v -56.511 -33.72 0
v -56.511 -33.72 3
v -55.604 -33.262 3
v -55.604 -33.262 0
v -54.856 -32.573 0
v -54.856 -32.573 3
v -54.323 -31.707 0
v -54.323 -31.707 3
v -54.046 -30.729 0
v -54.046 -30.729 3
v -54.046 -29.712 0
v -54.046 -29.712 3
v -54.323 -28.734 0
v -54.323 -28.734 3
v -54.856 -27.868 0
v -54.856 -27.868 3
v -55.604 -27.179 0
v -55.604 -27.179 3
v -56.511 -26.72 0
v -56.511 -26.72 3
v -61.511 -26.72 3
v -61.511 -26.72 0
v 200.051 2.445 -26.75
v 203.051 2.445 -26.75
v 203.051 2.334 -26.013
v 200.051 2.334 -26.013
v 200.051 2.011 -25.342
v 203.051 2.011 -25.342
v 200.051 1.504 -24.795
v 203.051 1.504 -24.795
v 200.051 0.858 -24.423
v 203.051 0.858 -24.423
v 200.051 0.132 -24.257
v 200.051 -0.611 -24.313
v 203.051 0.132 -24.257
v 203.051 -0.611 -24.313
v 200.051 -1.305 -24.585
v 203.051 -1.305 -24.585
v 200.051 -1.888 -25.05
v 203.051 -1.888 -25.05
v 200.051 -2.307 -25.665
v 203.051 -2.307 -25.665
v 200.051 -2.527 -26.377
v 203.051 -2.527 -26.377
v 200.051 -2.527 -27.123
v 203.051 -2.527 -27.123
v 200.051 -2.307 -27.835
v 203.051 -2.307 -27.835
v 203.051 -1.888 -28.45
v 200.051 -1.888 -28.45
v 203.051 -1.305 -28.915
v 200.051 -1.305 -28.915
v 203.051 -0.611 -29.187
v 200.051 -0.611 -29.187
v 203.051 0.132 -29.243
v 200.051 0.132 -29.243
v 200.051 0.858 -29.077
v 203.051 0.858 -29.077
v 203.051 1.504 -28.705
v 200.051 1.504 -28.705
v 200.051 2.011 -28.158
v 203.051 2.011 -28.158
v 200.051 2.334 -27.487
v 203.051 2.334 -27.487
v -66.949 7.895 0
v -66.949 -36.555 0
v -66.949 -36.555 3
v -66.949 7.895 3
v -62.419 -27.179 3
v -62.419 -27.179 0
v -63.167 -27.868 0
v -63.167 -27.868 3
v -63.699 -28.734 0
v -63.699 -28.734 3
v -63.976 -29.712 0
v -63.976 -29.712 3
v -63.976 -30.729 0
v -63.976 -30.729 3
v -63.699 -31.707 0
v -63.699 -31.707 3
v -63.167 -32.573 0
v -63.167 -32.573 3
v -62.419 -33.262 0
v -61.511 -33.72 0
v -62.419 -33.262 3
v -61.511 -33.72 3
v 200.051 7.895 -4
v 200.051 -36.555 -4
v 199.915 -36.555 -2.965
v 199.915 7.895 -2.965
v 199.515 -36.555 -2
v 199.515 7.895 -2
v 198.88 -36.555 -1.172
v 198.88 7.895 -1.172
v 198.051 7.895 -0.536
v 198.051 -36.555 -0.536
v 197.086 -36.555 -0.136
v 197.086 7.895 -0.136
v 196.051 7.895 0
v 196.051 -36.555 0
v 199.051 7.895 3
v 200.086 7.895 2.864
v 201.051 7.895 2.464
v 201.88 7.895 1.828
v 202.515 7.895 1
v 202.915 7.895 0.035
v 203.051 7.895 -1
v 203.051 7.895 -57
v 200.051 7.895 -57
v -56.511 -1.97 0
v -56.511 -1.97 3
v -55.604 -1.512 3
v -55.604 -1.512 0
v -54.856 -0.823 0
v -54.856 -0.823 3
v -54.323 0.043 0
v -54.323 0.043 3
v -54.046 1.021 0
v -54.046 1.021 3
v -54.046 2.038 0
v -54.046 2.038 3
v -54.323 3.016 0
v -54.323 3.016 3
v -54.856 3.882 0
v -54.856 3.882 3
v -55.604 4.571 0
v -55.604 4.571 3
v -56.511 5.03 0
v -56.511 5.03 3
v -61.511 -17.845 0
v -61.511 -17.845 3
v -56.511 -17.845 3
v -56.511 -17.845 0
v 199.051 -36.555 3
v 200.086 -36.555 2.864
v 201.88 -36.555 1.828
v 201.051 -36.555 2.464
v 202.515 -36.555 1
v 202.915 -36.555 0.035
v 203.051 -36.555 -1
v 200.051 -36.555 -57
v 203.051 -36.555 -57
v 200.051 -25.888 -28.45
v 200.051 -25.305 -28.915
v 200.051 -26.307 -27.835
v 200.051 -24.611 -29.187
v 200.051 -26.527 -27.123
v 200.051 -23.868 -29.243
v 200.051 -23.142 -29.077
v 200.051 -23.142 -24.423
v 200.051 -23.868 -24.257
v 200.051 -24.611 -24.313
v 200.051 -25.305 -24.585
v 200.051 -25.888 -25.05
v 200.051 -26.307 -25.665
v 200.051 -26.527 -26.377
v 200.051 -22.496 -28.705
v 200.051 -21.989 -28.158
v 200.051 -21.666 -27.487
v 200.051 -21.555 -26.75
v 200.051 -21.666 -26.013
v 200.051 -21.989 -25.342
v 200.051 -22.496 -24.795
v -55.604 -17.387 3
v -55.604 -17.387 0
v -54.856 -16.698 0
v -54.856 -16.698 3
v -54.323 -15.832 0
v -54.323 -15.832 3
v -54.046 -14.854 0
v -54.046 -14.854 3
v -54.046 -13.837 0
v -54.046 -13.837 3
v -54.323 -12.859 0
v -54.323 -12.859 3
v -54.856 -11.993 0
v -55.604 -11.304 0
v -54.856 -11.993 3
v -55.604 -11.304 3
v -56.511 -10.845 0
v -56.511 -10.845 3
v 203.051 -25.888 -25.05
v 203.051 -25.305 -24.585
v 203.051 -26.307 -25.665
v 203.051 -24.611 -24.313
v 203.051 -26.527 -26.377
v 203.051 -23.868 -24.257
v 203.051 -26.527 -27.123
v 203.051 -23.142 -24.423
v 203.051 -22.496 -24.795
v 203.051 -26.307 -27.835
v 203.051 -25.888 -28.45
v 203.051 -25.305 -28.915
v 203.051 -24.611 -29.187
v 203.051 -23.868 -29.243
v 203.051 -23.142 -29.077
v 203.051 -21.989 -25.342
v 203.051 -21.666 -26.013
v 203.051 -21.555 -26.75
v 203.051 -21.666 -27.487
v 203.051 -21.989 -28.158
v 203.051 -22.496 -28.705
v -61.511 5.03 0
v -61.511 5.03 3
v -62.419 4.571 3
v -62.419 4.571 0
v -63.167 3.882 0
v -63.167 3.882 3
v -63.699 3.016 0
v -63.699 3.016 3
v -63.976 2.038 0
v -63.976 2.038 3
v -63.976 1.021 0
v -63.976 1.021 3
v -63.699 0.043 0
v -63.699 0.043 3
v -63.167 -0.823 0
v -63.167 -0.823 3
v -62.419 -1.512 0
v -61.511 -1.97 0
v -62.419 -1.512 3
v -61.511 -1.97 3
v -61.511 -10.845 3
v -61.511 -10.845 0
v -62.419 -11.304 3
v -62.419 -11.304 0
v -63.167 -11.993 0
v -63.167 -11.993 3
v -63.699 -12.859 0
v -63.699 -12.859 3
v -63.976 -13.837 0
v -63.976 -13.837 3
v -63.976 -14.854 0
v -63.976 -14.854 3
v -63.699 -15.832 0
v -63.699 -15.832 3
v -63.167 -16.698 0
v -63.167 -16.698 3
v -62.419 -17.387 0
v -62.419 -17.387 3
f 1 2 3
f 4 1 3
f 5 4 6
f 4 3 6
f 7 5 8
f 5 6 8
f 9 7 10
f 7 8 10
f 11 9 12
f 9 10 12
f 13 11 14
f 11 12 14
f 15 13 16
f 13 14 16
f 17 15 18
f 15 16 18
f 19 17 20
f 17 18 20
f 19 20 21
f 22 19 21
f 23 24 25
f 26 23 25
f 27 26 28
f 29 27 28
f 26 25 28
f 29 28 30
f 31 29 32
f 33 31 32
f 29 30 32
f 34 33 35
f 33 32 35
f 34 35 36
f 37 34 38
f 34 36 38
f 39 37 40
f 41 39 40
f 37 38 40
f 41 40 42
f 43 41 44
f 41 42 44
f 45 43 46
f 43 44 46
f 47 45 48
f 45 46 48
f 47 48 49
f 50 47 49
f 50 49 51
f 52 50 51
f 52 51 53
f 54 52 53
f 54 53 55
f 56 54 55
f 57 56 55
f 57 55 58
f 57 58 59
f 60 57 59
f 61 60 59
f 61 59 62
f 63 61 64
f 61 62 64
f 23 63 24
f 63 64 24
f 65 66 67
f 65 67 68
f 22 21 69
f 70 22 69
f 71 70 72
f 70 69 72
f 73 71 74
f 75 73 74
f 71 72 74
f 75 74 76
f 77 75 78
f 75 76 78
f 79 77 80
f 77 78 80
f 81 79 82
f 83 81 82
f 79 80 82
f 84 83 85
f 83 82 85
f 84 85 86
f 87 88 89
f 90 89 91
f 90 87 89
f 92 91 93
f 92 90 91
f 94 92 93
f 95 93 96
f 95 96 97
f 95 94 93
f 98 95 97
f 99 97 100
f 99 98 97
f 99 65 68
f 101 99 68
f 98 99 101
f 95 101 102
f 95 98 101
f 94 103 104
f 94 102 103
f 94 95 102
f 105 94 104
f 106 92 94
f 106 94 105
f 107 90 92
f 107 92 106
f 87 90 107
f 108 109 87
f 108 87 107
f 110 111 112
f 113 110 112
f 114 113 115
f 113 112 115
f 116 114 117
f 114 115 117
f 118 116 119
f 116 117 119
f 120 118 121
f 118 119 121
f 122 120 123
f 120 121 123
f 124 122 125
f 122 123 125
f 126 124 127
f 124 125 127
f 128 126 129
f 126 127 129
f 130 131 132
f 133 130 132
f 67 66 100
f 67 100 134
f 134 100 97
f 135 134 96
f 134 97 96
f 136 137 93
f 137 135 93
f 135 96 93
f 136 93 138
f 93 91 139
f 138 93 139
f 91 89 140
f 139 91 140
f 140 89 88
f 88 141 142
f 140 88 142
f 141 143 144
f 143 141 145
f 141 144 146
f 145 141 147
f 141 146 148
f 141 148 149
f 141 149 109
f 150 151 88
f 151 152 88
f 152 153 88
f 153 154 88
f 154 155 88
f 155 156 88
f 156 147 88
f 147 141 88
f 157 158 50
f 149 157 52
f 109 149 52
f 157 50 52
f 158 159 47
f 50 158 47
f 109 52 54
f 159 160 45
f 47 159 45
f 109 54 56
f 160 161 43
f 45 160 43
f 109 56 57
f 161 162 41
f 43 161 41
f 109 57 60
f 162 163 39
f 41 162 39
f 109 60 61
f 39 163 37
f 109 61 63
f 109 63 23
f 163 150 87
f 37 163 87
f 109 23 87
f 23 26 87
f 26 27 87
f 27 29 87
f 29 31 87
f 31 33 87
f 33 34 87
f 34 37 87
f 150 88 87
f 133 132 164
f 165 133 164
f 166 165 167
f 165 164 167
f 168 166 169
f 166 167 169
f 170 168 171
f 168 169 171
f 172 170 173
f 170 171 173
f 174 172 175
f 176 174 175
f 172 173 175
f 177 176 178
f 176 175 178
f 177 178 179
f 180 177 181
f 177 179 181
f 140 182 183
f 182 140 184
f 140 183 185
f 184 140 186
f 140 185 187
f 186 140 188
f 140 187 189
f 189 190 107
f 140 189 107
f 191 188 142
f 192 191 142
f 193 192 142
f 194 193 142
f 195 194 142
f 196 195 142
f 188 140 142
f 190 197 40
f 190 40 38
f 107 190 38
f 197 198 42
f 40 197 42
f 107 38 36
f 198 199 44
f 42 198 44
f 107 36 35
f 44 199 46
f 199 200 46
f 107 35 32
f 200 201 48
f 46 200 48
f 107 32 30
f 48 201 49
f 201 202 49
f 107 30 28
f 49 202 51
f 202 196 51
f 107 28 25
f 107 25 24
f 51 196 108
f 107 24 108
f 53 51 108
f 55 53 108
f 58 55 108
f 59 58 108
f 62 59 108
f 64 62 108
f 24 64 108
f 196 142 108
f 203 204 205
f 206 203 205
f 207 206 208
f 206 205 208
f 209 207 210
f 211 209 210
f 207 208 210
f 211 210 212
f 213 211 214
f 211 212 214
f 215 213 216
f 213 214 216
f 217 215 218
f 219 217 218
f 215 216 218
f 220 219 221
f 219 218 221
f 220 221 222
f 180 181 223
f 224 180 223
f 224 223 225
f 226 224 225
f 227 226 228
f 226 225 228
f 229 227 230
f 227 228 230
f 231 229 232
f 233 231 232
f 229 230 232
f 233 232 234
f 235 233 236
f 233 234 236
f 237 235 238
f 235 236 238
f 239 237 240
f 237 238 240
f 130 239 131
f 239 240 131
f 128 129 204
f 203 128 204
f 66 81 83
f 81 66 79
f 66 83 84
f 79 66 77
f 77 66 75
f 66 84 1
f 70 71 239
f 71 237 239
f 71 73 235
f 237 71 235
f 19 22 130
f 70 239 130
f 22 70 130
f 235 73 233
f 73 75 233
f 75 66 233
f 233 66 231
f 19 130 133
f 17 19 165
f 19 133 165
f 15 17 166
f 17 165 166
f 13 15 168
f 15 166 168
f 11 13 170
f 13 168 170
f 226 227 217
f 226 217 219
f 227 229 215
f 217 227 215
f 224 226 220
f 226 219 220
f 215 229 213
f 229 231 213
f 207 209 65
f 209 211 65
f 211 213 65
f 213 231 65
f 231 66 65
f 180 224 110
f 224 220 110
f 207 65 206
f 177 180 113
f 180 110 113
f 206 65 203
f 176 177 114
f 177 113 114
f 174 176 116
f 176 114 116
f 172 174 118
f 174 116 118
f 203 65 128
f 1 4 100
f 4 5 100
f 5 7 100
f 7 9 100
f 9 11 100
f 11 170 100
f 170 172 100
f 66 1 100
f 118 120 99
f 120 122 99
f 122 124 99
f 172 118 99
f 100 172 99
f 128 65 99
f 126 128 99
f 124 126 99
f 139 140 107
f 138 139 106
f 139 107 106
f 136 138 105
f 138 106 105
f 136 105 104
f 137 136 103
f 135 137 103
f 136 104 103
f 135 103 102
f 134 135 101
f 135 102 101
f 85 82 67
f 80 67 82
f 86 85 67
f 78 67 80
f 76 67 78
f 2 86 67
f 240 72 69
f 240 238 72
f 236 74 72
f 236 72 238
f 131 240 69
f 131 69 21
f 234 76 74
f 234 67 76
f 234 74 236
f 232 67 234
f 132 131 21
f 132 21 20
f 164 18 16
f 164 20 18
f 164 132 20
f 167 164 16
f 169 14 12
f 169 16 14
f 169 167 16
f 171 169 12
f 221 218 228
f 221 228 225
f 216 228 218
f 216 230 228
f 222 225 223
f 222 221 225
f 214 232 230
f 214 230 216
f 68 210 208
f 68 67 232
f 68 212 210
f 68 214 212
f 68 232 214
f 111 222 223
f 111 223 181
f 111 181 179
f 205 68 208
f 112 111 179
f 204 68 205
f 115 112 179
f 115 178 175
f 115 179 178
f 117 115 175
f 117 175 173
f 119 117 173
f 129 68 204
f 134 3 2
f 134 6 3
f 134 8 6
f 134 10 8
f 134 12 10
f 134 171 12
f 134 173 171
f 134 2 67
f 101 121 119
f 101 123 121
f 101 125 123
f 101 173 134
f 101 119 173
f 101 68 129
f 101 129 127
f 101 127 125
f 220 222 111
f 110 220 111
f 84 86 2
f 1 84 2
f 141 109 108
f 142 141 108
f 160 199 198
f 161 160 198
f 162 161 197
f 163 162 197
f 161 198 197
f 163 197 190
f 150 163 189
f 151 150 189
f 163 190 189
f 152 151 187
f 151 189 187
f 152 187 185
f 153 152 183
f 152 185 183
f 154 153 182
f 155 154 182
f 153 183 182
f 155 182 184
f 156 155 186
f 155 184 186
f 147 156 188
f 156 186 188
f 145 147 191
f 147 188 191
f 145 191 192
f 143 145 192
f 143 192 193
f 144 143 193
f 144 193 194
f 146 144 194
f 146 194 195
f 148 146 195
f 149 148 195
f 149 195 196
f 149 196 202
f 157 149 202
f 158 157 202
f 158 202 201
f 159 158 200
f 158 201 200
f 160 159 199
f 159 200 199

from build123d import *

# Parameters (mm, degrees)
F0_W     = 270
F0_H     = 44.45
F1_DEPTH = 3
F3_DEPTH = 3
F2_W     = 3
F2_H     = 44.45
F4_DEPTH = 60
F5_R     = 2.5
F6_DEPTH = 3
F7_R     = 4
F8_R     = 4


# Not quite as in the source:
# - a feature names something its author has since deleted; it is built from what else it names


with BuildPart() as f1:
    # F0 (on Top) → F1 (new body)
    with BuildSketch(Plane.XY):
        with Locations((68.0511838198, -14.3298729897)):
            Rectangle(F0_W, F0_H)
    extrude(amount=F1_DEPTH)

    # F2 (on face) → F3 (cut)
    with BuildSketch(Plane.XY.offset(3)):
        with BuildLine():
            Line((-56.5113161802, -26.720496912), (-59.0113161802, -26.720496912))
            Line((-59.0113161802, -26.720496912), (-61.5113161802, -26.720496912))
            ThreePointArc((-61.5113161802, -26.720496912), (-64.0113244271, -30.220496912), (-61.5113161802, -33.720496912))
            Line((-61.5113161802, -33.720496912), (-59.0113161802, -33.720496912))
            Line((-59.0113161802, -33.720496912), (-56.5113161802, -33.720496912))
            ThreePointArc((-56.5113161802, -33.720496912), (-54.0113161802, -30.220496912), (-56.5113161802, -26.720496912))
        make_face()
        with BuildLine():
            Line((-61.5113161802, -17.845496912), (-59.0113161802, -17.845496912))
            Line((-59.0113161802, -17.845496912), (-56.5113161802, -17.845496912))
            ThreePointArc((-56.5113161802, -17.845496912), (-54.0113161802, -14.345496912), (-56.5113161802, -10.845496912))
            Line((-56.5113161802, -10.845496912), (-59.0113161802, -10.845496912))
            Line((-59.0113161802, -10.845496912), (-61.5113161802, -10.845496912))
            ThreePointArc((-61.5113161802, -10.845496912), (-64.0113244271, -14.345496912), (-61.5113161802, -17.845496912))
        make_face()
        with BuildLine():
            Line((-61.5113161802, -1.970496912), (-59.0113161802, -1.970496912))
            Line((-59.0113161802, -1.970496912), (-56.5113161802, -1.970496912))
            ThreePointArc((-56.5113161802, -1.970496912), (-54.0113161802, 1.529503088), (-56.5113161802, 5.029503088))
            Line((-56.5113161802, 5.029503088), (-59.0113161802, 5.029503088))
            Line((-59.0113161802, 5.029503088), (-61.5113161802, 5.029503088))
            ThreePointArc((-61.5113161802, 5.029503088), (-64.0113244271, 1.529503088), (-61.5113161802, -1.970496912))
        make_face()
    extrude(amount=-F3_DEPTH, mode=Mode.SUBTRACT)

    # F2 (on face) → F4 (join)
    with BuildSketch(Plane.XY.offset(3)):
        with Locations((201.5511838198, -14.3298729897)):
            Rectangle(F2_W, F2_H)
    extrude(amount=-F4_DEPTH)

    # F5 (on face) → F6 (cut)
    with BuildSketch(Plane.YZ.offset(203.0511838198)):
        with Locations((-24.0548729897, -26.75)):
            Circle(F5_R)
        with Locations((-0.0548729897, -26.75)):
            Circle(F5_R)
    extrude(amount=-F6_DEPTH, mode=Mode.SUBTRACT)

    # F7
    f7_edges = [f1.edges().sort_by_distance(p)[0] for p in [
        (200.051184, -14.329873, 0),
    ]]
    fillet(f7_edges, radius=F7_R)

    # F8
    f8_edges = [f1.edges().sort_by_distance(p)[0] for p in [
        (203.051184, -14.329873, 3),
    ]]
    fillet(f8_edges, radius=F8_R)


solid = f1.part
